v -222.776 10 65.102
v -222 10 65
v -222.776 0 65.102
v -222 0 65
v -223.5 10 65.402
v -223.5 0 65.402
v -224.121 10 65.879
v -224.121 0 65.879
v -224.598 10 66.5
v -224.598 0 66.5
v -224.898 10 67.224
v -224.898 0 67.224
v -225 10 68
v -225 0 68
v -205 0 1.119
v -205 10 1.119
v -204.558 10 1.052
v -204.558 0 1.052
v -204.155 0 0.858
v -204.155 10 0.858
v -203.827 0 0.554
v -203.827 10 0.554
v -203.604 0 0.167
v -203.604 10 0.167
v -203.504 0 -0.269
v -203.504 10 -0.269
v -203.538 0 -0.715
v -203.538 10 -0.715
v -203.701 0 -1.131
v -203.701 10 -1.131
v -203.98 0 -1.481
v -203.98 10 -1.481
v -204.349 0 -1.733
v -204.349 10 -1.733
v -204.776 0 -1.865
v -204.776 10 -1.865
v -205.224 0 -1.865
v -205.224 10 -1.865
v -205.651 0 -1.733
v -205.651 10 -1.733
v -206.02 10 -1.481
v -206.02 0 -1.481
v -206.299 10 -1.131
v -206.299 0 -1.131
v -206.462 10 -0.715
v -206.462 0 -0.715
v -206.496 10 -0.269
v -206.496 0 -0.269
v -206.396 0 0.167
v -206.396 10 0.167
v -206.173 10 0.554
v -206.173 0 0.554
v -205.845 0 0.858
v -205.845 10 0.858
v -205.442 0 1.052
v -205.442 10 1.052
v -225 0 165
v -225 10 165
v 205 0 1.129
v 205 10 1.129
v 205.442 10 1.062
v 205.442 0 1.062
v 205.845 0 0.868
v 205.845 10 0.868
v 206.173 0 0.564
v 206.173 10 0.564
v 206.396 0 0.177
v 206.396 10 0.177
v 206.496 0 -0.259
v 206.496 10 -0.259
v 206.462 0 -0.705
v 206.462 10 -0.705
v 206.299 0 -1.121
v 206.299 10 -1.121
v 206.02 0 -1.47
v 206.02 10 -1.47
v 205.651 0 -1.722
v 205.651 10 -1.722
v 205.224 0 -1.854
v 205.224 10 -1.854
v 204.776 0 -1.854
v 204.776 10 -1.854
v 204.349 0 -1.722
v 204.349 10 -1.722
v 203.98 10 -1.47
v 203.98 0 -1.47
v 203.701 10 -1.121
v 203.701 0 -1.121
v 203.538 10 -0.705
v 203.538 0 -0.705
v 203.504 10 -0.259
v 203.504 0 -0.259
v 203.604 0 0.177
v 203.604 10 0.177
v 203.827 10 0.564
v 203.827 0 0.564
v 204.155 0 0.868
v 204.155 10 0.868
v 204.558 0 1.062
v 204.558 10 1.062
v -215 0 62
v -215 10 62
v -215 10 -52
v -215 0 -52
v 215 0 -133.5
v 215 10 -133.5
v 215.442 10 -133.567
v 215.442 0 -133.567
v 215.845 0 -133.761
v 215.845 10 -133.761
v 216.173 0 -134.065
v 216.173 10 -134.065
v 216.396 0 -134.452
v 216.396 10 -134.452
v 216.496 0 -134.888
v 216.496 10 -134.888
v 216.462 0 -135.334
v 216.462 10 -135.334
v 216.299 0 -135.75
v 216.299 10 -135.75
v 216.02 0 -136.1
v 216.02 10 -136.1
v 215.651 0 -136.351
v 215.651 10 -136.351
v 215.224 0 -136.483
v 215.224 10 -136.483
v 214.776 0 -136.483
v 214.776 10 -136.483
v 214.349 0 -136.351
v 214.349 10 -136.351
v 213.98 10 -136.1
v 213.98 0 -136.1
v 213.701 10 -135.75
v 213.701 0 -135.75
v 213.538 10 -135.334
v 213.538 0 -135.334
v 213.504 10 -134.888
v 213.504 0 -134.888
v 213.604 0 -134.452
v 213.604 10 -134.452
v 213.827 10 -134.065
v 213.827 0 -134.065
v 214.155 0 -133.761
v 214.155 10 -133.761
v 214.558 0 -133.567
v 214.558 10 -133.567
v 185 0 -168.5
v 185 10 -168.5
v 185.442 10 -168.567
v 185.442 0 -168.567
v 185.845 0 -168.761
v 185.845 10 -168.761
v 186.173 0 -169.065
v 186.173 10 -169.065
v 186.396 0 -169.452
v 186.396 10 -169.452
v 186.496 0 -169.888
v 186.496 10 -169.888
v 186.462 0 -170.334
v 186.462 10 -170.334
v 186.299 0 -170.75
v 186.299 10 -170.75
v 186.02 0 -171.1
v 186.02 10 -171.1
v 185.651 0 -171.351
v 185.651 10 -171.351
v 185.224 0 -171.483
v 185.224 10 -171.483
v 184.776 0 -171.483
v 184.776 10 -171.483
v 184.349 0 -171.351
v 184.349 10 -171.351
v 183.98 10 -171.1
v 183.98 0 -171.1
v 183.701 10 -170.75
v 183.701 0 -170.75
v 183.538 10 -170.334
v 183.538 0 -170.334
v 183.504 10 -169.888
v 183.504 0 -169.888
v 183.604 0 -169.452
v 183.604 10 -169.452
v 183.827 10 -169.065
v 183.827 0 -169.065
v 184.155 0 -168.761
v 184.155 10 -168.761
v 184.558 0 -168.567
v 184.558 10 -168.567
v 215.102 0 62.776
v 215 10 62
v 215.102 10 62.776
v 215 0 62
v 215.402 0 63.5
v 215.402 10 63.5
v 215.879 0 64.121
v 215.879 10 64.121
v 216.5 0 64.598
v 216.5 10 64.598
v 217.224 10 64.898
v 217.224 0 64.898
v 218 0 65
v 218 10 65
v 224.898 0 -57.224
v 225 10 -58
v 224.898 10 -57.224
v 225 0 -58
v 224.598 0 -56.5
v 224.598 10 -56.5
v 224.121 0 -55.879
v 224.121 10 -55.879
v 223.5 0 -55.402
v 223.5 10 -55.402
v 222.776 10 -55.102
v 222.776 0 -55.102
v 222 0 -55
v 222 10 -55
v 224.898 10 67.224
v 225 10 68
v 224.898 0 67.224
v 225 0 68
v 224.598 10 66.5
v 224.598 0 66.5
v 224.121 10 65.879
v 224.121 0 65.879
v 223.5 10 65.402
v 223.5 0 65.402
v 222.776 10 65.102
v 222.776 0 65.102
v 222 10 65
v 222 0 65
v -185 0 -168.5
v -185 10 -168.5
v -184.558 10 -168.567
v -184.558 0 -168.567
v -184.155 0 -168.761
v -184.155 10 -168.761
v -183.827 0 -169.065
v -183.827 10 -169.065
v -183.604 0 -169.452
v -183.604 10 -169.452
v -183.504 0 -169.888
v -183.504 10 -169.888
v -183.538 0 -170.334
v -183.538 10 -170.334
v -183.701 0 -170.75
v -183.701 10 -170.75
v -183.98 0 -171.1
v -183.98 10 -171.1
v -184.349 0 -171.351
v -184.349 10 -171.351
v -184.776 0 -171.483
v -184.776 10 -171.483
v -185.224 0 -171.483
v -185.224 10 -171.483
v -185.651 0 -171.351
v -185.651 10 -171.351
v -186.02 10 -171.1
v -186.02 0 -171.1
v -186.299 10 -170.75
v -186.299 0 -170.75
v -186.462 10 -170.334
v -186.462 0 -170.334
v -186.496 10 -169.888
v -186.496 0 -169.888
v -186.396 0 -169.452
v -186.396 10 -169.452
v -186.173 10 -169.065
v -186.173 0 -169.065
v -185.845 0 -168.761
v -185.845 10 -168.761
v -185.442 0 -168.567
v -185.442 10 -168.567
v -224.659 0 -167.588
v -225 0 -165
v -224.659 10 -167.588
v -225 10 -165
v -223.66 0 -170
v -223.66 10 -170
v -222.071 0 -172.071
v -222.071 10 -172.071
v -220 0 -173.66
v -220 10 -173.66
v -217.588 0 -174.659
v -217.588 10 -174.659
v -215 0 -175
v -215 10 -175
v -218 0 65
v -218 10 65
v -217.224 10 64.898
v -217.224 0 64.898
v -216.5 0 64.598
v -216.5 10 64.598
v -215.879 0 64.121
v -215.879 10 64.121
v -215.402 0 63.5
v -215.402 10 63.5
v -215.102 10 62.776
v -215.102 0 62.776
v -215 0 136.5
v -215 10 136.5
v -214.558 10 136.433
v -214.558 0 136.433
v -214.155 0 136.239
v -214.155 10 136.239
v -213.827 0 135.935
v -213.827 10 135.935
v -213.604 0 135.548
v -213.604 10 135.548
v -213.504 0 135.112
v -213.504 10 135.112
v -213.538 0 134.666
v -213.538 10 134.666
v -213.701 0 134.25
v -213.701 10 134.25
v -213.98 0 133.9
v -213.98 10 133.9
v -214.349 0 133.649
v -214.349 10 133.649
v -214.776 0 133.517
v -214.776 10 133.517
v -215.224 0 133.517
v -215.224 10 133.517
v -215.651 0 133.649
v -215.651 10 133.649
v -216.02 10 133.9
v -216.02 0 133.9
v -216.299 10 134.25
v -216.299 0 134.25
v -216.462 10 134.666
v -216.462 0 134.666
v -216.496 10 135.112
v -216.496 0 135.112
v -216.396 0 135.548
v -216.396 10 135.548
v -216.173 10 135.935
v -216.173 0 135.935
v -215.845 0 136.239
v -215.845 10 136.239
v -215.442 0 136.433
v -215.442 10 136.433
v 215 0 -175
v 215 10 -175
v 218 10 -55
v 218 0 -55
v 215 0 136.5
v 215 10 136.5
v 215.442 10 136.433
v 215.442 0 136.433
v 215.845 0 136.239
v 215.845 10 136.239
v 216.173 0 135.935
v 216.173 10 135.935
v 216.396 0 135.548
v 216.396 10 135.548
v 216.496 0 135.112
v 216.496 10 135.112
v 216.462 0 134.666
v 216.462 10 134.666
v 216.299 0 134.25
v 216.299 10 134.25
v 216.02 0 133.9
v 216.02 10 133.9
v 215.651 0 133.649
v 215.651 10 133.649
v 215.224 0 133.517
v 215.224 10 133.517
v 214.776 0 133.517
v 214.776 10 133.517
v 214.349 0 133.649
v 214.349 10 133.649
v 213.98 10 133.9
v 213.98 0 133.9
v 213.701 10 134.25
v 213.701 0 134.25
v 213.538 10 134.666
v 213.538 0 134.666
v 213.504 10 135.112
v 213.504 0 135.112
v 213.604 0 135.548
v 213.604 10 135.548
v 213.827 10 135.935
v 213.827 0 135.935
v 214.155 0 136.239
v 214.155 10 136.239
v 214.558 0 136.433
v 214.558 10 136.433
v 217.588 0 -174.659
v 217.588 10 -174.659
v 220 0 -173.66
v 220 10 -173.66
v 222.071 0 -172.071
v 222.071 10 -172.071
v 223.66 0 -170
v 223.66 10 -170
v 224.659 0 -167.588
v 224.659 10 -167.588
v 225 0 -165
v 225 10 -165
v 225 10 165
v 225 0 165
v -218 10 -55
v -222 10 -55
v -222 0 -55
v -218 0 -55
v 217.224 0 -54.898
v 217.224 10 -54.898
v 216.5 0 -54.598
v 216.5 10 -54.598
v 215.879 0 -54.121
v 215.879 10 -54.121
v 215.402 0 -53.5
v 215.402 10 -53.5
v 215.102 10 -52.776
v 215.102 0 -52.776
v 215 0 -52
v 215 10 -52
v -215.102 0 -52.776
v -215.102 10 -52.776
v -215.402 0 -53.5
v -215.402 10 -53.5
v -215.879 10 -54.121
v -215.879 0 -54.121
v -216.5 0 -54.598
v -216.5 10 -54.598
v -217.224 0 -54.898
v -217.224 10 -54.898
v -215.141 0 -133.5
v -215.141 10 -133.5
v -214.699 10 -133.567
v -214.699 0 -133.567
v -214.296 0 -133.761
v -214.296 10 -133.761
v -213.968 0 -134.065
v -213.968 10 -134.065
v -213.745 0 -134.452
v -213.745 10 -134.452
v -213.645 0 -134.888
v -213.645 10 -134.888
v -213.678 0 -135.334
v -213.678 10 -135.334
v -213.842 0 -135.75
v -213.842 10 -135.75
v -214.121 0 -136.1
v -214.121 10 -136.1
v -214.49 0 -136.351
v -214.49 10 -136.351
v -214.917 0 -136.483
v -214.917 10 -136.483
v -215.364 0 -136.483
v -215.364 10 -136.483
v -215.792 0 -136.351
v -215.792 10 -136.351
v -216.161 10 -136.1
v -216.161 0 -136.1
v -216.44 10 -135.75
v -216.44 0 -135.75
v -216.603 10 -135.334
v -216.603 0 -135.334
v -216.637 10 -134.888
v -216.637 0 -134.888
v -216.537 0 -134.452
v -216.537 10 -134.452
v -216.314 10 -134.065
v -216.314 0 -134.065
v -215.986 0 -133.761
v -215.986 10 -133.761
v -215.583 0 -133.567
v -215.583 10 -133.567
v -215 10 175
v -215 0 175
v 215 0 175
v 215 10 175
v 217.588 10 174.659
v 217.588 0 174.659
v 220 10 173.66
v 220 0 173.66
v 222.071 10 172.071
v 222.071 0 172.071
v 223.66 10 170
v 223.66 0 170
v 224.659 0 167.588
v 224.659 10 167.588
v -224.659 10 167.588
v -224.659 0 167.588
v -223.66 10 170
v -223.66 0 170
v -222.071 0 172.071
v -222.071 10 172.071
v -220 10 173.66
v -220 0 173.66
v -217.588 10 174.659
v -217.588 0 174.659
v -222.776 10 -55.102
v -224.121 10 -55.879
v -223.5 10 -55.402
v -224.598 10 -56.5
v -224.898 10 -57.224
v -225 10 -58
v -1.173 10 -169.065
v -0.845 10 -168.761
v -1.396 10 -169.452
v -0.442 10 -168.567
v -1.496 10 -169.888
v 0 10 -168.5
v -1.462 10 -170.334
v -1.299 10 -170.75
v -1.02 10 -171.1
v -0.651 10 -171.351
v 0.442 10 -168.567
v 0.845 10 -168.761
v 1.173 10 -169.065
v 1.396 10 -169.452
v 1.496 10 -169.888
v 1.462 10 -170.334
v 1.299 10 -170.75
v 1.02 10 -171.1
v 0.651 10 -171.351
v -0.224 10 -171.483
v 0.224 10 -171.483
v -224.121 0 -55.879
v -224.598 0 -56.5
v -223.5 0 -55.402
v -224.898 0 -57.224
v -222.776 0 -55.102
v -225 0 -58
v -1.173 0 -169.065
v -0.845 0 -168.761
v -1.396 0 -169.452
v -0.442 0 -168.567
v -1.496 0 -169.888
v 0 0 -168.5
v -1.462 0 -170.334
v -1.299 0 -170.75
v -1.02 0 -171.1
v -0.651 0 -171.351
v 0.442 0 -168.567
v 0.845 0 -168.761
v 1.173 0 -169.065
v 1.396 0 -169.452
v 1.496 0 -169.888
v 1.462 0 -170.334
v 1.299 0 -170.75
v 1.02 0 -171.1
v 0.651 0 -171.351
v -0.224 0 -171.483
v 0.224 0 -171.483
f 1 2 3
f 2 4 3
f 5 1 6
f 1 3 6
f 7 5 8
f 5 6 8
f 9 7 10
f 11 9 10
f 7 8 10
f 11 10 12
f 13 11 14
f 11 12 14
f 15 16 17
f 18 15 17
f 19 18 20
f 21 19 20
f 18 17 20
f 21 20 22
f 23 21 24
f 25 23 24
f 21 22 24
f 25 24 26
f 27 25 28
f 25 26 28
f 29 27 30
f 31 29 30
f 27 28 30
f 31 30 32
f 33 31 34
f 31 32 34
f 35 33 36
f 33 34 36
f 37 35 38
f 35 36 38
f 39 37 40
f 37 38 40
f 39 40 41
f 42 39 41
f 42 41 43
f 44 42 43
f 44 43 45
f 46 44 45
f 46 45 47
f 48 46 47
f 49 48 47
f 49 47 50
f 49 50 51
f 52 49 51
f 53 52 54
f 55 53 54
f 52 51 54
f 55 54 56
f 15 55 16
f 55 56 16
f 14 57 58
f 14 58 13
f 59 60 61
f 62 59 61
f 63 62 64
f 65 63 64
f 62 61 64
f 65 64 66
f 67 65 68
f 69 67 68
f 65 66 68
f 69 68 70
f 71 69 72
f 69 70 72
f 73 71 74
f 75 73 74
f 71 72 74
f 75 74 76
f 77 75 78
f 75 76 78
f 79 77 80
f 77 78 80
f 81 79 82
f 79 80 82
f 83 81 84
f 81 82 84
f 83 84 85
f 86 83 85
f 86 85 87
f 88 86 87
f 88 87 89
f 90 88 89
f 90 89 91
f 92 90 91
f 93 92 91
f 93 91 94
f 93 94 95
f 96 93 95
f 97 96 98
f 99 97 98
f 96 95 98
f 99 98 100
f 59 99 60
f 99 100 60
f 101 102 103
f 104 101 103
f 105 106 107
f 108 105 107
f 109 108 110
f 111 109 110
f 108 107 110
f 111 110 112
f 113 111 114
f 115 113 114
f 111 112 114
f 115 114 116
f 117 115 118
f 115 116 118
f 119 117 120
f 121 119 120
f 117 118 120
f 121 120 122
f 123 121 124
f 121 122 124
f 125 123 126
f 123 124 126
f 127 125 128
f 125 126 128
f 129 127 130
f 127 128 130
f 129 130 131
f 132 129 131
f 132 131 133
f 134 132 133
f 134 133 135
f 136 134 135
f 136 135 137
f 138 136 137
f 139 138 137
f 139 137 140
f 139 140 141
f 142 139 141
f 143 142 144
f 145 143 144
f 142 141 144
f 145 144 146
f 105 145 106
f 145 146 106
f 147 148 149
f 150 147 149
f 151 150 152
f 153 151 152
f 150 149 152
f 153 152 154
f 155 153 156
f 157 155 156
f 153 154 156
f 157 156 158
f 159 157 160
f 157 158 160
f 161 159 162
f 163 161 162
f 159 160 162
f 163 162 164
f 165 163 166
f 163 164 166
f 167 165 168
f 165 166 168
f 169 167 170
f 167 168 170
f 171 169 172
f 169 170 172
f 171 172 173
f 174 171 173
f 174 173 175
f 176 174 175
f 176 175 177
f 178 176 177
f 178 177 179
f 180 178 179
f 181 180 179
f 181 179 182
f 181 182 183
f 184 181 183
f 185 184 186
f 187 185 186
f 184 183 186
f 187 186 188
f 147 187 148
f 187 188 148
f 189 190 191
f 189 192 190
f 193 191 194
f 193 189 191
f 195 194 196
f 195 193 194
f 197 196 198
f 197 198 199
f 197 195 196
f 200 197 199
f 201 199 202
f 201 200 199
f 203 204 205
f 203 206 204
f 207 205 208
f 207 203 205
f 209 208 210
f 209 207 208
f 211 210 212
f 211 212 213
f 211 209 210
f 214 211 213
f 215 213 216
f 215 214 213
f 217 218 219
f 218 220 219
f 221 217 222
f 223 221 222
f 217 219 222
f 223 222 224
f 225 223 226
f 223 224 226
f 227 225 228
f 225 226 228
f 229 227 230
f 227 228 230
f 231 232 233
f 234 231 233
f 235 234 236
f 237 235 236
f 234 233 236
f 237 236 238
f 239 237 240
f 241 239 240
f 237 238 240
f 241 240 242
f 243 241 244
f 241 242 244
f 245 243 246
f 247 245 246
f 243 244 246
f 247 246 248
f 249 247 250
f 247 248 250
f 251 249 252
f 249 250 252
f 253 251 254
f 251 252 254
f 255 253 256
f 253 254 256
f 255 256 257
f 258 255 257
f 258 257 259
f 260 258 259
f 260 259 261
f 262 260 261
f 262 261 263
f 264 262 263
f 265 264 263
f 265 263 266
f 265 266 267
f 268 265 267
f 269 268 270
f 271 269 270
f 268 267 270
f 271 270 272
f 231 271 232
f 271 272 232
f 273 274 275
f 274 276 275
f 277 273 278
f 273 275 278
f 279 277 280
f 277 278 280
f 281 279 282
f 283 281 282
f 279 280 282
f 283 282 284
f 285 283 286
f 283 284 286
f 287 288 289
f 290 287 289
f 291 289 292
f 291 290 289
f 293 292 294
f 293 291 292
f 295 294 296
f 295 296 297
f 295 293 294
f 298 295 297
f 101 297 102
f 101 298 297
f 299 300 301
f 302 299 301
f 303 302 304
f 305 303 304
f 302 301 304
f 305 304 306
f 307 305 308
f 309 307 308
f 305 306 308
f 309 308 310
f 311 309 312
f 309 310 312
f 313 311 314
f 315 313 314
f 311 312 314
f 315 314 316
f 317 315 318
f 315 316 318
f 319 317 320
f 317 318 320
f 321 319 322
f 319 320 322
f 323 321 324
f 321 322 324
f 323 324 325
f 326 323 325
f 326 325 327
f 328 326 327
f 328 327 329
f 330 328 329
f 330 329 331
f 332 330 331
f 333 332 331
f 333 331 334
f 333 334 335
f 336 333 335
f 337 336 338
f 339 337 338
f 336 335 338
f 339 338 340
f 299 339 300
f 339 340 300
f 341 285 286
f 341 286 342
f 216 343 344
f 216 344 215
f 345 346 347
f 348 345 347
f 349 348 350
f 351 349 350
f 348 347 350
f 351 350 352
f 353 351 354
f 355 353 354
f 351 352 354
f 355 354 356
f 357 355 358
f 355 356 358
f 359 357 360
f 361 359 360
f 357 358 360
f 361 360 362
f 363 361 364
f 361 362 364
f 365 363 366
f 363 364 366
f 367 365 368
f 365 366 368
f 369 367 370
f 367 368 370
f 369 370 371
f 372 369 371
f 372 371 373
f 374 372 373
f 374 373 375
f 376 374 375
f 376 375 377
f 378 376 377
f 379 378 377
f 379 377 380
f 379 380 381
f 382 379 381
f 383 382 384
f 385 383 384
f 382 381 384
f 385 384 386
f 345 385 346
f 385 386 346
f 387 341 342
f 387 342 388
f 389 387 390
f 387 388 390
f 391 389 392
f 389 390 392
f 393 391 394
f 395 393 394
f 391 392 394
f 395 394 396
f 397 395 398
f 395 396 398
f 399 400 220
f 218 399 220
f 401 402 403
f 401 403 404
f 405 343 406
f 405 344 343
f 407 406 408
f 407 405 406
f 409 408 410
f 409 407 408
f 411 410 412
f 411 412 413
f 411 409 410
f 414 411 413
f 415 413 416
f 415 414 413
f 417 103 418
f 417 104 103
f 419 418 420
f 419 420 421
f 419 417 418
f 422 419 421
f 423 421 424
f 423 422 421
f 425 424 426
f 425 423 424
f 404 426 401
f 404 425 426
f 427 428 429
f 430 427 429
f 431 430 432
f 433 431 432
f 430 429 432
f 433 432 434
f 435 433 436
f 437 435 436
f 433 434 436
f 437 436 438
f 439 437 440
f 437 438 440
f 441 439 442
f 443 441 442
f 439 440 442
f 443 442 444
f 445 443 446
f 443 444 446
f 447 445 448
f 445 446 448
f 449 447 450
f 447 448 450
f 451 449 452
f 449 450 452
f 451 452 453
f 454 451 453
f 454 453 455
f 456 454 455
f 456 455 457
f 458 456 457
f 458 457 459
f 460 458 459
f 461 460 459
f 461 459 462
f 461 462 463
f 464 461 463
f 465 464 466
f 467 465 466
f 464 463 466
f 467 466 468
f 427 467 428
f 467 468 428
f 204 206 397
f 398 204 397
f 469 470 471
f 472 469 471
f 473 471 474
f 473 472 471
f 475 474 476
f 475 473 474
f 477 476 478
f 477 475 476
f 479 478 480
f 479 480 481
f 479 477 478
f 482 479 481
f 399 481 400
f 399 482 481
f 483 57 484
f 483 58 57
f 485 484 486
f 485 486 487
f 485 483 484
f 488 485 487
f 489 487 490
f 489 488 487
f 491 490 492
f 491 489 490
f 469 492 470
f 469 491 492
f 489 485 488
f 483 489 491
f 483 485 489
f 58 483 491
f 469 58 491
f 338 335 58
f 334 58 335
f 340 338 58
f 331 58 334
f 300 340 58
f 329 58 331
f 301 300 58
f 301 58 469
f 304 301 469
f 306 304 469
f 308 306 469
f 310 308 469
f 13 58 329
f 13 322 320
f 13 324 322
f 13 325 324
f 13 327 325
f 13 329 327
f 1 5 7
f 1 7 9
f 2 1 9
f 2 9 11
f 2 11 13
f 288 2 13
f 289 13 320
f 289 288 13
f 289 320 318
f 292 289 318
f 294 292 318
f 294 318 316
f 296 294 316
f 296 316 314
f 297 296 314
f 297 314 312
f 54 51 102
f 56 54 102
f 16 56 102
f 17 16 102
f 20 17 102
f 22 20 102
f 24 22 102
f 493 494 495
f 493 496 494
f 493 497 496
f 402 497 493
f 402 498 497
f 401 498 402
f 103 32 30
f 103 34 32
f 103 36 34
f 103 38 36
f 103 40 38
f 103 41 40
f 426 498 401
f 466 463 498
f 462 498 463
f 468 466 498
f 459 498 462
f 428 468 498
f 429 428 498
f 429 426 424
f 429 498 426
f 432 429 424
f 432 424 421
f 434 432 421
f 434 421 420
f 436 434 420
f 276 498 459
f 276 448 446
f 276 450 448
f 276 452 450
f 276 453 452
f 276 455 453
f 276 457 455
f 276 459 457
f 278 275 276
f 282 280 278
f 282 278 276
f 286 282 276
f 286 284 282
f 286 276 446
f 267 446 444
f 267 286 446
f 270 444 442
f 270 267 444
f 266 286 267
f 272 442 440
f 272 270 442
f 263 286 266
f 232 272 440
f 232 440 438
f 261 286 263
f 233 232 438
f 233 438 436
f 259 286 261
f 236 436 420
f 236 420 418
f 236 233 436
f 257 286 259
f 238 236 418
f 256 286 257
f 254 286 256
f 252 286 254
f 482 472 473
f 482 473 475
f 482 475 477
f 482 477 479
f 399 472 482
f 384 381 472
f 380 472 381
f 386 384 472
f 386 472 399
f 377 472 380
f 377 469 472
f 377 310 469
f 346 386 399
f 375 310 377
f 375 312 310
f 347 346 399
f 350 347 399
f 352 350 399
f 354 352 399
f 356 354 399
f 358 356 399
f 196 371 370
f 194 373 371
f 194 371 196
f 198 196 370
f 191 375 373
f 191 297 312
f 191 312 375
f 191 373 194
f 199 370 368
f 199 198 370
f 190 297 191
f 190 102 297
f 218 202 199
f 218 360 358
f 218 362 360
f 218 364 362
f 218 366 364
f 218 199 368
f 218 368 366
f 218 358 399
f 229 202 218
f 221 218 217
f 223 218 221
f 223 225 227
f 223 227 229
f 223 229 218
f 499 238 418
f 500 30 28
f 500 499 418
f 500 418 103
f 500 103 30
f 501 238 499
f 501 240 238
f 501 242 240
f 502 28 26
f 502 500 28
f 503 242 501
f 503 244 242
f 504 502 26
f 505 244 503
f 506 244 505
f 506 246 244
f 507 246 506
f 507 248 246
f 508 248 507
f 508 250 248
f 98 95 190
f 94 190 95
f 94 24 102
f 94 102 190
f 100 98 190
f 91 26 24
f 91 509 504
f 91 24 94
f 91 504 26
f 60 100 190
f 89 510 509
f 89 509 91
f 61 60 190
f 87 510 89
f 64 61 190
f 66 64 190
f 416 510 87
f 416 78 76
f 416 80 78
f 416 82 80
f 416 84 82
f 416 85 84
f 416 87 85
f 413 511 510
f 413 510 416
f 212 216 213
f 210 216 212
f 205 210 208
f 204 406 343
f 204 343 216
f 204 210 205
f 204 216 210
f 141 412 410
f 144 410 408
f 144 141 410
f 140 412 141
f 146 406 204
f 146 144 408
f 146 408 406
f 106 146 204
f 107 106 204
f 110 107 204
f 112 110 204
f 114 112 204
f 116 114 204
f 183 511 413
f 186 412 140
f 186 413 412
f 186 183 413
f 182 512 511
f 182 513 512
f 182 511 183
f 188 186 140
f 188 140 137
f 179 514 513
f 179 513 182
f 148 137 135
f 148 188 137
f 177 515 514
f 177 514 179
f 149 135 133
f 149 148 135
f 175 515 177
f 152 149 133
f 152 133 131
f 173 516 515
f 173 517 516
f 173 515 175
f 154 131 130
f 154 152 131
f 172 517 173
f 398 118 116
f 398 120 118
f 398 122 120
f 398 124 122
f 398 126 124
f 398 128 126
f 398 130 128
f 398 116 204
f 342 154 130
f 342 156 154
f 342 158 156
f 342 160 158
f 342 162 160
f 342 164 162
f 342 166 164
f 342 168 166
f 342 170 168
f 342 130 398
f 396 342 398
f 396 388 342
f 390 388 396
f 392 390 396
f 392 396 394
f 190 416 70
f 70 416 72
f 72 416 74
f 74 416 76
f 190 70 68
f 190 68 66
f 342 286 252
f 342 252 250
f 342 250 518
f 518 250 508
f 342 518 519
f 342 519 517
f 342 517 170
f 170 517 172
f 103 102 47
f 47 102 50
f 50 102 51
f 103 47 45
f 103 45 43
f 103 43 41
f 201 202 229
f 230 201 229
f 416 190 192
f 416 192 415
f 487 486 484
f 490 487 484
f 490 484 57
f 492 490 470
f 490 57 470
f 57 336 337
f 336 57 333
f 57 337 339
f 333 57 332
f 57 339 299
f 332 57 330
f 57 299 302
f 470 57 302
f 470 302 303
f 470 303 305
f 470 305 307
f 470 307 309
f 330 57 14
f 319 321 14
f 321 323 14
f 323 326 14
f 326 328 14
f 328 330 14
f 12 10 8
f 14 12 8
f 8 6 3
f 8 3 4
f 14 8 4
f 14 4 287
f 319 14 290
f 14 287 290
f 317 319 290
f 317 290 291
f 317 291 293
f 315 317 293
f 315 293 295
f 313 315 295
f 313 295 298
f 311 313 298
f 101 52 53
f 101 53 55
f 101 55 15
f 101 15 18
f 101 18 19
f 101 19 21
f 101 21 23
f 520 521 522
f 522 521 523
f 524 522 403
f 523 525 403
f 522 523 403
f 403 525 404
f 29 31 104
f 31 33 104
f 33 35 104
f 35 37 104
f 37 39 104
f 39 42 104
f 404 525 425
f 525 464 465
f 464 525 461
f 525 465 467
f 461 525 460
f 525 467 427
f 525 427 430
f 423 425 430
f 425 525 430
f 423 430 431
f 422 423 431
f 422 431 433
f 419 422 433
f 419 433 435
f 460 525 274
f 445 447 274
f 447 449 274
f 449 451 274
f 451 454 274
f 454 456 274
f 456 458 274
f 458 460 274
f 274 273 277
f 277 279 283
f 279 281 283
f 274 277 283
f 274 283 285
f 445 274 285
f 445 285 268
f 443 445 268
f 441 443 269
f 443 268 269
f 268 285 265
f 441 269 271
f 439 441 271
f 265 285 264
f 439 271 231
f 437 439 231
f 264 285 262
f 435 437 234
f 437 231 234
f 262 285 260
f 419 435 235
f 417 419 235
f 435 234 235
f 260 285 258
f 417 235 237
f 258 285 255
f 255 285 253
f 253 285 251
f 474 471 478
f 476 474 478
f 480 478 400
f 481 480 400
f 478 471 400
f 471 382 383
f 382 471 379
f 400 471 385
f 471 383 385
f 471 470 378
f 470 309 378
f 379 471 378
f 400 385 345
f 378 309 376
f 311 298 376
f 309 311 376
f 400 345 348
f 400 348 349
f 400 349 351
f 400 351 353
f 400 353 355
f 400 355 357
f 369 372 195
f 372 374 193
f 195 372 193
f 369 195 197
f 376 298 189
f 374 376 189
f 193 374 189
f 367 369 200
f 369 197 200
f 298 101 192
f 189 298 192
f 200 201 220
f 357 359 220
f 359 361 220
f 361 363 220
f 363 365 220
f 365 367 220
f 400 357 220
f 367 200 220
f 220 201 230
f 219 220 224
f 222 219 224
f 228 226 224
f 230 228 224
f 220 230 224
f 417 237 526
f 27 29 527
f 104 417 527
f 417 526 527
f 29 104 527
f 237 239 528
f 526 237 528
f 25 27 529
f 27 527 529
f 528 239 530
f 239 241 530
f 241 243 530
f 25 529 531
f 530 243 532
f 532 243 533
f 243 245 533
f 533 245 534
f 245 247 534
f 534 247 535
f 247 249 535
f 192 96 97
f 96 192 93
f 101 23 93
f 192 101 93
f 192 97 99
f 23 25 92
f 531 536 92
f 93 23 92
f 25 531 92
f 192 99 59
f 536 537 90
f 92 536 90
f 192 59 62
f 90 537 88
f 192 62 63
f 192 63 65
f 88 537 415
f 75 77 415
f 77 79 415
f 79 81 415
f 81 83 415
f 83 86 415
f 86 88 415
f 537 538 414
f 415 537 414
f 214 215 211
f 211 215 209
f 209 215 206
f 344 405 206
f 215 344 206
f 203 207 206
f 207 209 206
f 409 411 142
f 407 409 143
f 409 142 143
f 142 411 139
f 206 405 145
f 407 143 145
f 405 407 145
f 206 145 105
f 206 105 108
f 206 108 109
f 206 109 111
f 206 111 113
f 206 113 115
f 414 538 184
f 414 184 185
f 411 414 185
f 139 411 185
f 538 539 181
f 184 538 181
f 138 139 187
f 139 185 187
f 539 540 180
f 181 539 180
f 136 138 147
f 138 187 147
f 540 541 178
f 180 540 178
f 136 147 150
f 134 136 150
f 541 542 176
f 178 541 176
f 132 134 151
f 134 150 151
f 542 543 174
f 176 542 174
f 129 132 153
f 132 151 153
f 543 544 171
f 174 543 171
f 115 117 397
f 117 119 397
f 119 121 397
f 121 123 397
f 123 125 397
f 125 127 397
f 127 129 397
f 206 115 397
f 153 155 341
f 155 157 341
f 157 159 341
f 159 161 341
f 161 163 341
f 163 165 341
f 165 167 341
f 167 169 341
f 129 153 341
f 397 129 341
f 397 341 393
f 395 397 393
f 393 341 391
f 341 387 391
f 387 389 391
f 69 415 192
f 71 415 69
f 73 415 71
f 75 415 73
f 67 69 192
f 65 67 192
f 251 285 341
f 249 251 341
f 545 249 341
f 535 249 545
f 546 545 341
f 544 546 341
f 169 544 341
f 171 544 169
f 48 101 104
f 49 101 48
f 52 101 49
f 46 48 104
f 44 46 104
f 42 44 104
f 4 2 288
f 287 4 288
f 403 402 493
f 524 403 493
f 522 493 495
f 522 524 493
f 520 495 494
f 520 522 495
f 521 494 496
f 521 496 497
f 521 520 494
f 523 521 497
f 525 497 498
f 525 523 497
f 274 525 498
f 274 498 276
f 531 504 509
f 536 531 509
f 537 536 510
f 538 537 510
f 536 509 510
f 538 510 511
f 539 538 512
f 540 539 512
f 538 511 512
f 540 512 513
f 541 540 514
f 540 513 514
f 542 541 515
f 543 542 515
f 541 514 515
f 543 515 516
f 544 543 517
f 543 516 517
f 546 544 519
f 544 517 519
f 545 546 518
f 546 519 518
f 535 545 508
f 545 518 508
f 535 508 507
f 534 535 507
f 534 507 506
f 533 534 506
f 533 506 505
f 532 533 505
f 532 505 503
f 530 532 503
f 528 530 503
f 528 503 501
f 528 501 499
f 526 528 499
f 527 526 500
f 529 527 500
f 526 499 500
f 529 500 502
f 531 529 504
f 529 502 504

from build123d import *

# Parameters (mm, degrees)
SKETCH1_W           = 450
SKETCH1_H           = 350
BOSS_EXTRUDE1_DEPTH = 10
SKETCH2_R           = 3
CUT_EXTRUDE1_DEPTH  = 10
SKETCH3_W           = 10
SKETCH3_H           = 120
CUT_EXTRUDE2_DEPTH  = 10
FILLET1_R           = 3
FILLET2_R           = 3
FILLET3_R           = 10
SKETCH5_R           = 3
BOSS_EXTRUDE3_DEPTH = 10
SKETCH6_R           = 3
BOSS_EXTRUDE4_DEPTH = 10
SKETCH7_R           = 1.5
CUT_EXTRUDE3_DEPTH  = 10


with BuildPart() as part:
    # Sketch1 → Boss-Extrude1 (new body)
    with BuildSketch(Plane(origin=(0, 0, 0), x_dir=(1, 0, 0), z_dir=(0, 1, 0))):
        Rectangle(SKETCH1_W, SKETCH1_H)
    extrude(amount=BOSS_EXTRUDE1_DEPTH)

    # Sketch2 → Cut-Extrude1 (cut)
    with BuildSketch(Plane(origin=(0, 10, 0), x_dir=(1, 0, 0), z_dir=(0, 1, 0))):
        with Locations(Location((-215, -135, 0), (0, 0, 270))):
            Circle(SKETCH2_R)
        with Locations(Location((-205, 0.370879822, 0), (0, 0, 270))):
            Circle(SKETCH2_R)
        with Locations(Location((-215, 135, 0), (0, 0, 270))):
            Circle(SKETCH2_R)
        with Locations(Location((215, 135, 0), (0, 0, 270))):
            Circle(SKETCH2_R)
        with Locations(Location((205, 0, 0), (0, 0, 270))):
            Circle(SKETCH2_R)
        with Locations(Location((215, -135, 0), (0, 0, 270))):
            Circle(SKETCH2_R)
        with Locations(Location((-185, 170, 0), (0, 0, 270))):
            Circle(SKETCH2_R)
        with Locations(Location((0, 170, 0), (0, 0, 270))):
            Circle(SKETCH2_R)
        with Locations(Location((185, 170, 0), (0, 0, 270))):
            Circle(SKETCH2_R)
    extrude(amount=-CUT_EXTRUDE1_DEPTH, mode=Mode.SUBTRACT)

    # Sketch3 → Cut-Extrude2 (cut)
    with BuildSketch(Plane(origin=(0, 10, 0), x_dir=(1, 0, 0), z_dir=(0, 1, 0))):
        with Locations((-220, -5)):
            Rectangle(SKETCH3_W, SKETCH3_H)
        with Locations((220, -5)):
            Rectangle(SKETCH3_W, SKETCH3_H)
    extrude(amount=-CUT_EXTRUDE2_DEPTH, mode=Mode.SUBTRACT)

    # Fillet1
    fillet1_edges = [part.edges().sort_by_distance(p)[0] for p in [
        (-215, 5, -55),
        (-215, 5, 65),
        (215, 5, 65),
        (215, 5, -55),
    ]]
    fillet(fillet1_edges, radius=FILLET1_R)

    # Fillet2
    fillet2_edges = [part.edges().sort_by_distance(p)[0] for p in [
        (-225, 5, 65),
        (-225, 5, -55),
        (225, 5, -55),
        (225, 5, 65),
    ]]
    fillet(fillet2_edges, radius=FILLET2_R)

    # Fillet3
    fillet3_edges = [part.edges().sort_by_distance(p)[0] for p in [
        (-225, 5, -175),
        (225, 5, -175),
        (225, 5, 175),
        (-225, 5, 175),
    ]]
    fillet(fillet3_edges, radius=FILLET3_R)

    # Sketch5 → Boss-Extrude3 (add)
    with BuildSketch(Plane(origin=(0, 10, 0), x_dir=(1, 0, 0), z_dir=(0, 1, 0))):
        with Locations((-215, 135)):
            Circle(SKETCH5_R)
    extrude(amount=-BOSS_EXTRUDE3_DEPTH)

    # Sketch6 → Boss-Extrude4 (add)
    with BuildSketch(Plane(origin=(0, 10, 0), x_dir=(1, 0, 0), z_dir=(0, 1, 0))):
        with Locations((-185, 170)):
            Circle(SKETCH6_R)
        with Locations((0, 170)):
            Circle(SKETCH6_R)
        with Locations((185, 170)):
            Circle(SKETCH6_R)
        with Locations((215, 135)):
            Circle(SKETCH6_R)
        with Locations((205, 0)):
            Circle(SKETCH6_R)
        with Locations((215, -135)):
            Circle(SKETCH6_R)
        with Locations((-215, -135)):
            Circle(SKETCH6_R)
        with Locations((-205, 0.370879822)):
            Circle(SKETCH6_R)
    extrude(amount=-BOSS_EXTRUDE4_DEPTH)

    # Sketch7 → Cut-Extrude3 (cut)
    with BuildSketch(Plane(origin=(0, 10, 0), x_dir=(1, 0, 0), z_dir=(0, 1, 0))):
        with Locations(Location((-185, 170, 0), (0, 0, 270))):
            Circle(SKETCH7_R)
        with Locations(Location((-215.140831726, 135, 0), (0, 0, 270))):
            Circle(SKETCH7_R)
        with Locations(Location((-205, 0.381414612, 0), (0, 0, 270))):
            Circle(SKETCH7_R)
        with Locations(Location((-215, -135, 0), (0, 0, 270))):
            Circle(SKETCH7_R)
        with Locations(Location((215, -135, 0), (0, 0, 270))):
            Circle(SKETCH7_R)
        with Locations(Location((205, 0.370879822, 0), (0, 0, 270))):
            Circle(SKETCH7_R)
        with Locations(Location((215, 135, 0), (0, 0, 270))):
            Circle(SKETCH7_R)
        with Locations(Location((0, 170, 0), (0, 0, 270))):
            Circle(SKETCH7_R)
        with Locations(Location((185, 170, 0), (0, 0, 270))):
            Circle(SKETCH7_R)
    extrude(amount=-CUT_EXTRUDE3_DEPTH, mode=Mode.SUBTRACT)


solid = part.part
